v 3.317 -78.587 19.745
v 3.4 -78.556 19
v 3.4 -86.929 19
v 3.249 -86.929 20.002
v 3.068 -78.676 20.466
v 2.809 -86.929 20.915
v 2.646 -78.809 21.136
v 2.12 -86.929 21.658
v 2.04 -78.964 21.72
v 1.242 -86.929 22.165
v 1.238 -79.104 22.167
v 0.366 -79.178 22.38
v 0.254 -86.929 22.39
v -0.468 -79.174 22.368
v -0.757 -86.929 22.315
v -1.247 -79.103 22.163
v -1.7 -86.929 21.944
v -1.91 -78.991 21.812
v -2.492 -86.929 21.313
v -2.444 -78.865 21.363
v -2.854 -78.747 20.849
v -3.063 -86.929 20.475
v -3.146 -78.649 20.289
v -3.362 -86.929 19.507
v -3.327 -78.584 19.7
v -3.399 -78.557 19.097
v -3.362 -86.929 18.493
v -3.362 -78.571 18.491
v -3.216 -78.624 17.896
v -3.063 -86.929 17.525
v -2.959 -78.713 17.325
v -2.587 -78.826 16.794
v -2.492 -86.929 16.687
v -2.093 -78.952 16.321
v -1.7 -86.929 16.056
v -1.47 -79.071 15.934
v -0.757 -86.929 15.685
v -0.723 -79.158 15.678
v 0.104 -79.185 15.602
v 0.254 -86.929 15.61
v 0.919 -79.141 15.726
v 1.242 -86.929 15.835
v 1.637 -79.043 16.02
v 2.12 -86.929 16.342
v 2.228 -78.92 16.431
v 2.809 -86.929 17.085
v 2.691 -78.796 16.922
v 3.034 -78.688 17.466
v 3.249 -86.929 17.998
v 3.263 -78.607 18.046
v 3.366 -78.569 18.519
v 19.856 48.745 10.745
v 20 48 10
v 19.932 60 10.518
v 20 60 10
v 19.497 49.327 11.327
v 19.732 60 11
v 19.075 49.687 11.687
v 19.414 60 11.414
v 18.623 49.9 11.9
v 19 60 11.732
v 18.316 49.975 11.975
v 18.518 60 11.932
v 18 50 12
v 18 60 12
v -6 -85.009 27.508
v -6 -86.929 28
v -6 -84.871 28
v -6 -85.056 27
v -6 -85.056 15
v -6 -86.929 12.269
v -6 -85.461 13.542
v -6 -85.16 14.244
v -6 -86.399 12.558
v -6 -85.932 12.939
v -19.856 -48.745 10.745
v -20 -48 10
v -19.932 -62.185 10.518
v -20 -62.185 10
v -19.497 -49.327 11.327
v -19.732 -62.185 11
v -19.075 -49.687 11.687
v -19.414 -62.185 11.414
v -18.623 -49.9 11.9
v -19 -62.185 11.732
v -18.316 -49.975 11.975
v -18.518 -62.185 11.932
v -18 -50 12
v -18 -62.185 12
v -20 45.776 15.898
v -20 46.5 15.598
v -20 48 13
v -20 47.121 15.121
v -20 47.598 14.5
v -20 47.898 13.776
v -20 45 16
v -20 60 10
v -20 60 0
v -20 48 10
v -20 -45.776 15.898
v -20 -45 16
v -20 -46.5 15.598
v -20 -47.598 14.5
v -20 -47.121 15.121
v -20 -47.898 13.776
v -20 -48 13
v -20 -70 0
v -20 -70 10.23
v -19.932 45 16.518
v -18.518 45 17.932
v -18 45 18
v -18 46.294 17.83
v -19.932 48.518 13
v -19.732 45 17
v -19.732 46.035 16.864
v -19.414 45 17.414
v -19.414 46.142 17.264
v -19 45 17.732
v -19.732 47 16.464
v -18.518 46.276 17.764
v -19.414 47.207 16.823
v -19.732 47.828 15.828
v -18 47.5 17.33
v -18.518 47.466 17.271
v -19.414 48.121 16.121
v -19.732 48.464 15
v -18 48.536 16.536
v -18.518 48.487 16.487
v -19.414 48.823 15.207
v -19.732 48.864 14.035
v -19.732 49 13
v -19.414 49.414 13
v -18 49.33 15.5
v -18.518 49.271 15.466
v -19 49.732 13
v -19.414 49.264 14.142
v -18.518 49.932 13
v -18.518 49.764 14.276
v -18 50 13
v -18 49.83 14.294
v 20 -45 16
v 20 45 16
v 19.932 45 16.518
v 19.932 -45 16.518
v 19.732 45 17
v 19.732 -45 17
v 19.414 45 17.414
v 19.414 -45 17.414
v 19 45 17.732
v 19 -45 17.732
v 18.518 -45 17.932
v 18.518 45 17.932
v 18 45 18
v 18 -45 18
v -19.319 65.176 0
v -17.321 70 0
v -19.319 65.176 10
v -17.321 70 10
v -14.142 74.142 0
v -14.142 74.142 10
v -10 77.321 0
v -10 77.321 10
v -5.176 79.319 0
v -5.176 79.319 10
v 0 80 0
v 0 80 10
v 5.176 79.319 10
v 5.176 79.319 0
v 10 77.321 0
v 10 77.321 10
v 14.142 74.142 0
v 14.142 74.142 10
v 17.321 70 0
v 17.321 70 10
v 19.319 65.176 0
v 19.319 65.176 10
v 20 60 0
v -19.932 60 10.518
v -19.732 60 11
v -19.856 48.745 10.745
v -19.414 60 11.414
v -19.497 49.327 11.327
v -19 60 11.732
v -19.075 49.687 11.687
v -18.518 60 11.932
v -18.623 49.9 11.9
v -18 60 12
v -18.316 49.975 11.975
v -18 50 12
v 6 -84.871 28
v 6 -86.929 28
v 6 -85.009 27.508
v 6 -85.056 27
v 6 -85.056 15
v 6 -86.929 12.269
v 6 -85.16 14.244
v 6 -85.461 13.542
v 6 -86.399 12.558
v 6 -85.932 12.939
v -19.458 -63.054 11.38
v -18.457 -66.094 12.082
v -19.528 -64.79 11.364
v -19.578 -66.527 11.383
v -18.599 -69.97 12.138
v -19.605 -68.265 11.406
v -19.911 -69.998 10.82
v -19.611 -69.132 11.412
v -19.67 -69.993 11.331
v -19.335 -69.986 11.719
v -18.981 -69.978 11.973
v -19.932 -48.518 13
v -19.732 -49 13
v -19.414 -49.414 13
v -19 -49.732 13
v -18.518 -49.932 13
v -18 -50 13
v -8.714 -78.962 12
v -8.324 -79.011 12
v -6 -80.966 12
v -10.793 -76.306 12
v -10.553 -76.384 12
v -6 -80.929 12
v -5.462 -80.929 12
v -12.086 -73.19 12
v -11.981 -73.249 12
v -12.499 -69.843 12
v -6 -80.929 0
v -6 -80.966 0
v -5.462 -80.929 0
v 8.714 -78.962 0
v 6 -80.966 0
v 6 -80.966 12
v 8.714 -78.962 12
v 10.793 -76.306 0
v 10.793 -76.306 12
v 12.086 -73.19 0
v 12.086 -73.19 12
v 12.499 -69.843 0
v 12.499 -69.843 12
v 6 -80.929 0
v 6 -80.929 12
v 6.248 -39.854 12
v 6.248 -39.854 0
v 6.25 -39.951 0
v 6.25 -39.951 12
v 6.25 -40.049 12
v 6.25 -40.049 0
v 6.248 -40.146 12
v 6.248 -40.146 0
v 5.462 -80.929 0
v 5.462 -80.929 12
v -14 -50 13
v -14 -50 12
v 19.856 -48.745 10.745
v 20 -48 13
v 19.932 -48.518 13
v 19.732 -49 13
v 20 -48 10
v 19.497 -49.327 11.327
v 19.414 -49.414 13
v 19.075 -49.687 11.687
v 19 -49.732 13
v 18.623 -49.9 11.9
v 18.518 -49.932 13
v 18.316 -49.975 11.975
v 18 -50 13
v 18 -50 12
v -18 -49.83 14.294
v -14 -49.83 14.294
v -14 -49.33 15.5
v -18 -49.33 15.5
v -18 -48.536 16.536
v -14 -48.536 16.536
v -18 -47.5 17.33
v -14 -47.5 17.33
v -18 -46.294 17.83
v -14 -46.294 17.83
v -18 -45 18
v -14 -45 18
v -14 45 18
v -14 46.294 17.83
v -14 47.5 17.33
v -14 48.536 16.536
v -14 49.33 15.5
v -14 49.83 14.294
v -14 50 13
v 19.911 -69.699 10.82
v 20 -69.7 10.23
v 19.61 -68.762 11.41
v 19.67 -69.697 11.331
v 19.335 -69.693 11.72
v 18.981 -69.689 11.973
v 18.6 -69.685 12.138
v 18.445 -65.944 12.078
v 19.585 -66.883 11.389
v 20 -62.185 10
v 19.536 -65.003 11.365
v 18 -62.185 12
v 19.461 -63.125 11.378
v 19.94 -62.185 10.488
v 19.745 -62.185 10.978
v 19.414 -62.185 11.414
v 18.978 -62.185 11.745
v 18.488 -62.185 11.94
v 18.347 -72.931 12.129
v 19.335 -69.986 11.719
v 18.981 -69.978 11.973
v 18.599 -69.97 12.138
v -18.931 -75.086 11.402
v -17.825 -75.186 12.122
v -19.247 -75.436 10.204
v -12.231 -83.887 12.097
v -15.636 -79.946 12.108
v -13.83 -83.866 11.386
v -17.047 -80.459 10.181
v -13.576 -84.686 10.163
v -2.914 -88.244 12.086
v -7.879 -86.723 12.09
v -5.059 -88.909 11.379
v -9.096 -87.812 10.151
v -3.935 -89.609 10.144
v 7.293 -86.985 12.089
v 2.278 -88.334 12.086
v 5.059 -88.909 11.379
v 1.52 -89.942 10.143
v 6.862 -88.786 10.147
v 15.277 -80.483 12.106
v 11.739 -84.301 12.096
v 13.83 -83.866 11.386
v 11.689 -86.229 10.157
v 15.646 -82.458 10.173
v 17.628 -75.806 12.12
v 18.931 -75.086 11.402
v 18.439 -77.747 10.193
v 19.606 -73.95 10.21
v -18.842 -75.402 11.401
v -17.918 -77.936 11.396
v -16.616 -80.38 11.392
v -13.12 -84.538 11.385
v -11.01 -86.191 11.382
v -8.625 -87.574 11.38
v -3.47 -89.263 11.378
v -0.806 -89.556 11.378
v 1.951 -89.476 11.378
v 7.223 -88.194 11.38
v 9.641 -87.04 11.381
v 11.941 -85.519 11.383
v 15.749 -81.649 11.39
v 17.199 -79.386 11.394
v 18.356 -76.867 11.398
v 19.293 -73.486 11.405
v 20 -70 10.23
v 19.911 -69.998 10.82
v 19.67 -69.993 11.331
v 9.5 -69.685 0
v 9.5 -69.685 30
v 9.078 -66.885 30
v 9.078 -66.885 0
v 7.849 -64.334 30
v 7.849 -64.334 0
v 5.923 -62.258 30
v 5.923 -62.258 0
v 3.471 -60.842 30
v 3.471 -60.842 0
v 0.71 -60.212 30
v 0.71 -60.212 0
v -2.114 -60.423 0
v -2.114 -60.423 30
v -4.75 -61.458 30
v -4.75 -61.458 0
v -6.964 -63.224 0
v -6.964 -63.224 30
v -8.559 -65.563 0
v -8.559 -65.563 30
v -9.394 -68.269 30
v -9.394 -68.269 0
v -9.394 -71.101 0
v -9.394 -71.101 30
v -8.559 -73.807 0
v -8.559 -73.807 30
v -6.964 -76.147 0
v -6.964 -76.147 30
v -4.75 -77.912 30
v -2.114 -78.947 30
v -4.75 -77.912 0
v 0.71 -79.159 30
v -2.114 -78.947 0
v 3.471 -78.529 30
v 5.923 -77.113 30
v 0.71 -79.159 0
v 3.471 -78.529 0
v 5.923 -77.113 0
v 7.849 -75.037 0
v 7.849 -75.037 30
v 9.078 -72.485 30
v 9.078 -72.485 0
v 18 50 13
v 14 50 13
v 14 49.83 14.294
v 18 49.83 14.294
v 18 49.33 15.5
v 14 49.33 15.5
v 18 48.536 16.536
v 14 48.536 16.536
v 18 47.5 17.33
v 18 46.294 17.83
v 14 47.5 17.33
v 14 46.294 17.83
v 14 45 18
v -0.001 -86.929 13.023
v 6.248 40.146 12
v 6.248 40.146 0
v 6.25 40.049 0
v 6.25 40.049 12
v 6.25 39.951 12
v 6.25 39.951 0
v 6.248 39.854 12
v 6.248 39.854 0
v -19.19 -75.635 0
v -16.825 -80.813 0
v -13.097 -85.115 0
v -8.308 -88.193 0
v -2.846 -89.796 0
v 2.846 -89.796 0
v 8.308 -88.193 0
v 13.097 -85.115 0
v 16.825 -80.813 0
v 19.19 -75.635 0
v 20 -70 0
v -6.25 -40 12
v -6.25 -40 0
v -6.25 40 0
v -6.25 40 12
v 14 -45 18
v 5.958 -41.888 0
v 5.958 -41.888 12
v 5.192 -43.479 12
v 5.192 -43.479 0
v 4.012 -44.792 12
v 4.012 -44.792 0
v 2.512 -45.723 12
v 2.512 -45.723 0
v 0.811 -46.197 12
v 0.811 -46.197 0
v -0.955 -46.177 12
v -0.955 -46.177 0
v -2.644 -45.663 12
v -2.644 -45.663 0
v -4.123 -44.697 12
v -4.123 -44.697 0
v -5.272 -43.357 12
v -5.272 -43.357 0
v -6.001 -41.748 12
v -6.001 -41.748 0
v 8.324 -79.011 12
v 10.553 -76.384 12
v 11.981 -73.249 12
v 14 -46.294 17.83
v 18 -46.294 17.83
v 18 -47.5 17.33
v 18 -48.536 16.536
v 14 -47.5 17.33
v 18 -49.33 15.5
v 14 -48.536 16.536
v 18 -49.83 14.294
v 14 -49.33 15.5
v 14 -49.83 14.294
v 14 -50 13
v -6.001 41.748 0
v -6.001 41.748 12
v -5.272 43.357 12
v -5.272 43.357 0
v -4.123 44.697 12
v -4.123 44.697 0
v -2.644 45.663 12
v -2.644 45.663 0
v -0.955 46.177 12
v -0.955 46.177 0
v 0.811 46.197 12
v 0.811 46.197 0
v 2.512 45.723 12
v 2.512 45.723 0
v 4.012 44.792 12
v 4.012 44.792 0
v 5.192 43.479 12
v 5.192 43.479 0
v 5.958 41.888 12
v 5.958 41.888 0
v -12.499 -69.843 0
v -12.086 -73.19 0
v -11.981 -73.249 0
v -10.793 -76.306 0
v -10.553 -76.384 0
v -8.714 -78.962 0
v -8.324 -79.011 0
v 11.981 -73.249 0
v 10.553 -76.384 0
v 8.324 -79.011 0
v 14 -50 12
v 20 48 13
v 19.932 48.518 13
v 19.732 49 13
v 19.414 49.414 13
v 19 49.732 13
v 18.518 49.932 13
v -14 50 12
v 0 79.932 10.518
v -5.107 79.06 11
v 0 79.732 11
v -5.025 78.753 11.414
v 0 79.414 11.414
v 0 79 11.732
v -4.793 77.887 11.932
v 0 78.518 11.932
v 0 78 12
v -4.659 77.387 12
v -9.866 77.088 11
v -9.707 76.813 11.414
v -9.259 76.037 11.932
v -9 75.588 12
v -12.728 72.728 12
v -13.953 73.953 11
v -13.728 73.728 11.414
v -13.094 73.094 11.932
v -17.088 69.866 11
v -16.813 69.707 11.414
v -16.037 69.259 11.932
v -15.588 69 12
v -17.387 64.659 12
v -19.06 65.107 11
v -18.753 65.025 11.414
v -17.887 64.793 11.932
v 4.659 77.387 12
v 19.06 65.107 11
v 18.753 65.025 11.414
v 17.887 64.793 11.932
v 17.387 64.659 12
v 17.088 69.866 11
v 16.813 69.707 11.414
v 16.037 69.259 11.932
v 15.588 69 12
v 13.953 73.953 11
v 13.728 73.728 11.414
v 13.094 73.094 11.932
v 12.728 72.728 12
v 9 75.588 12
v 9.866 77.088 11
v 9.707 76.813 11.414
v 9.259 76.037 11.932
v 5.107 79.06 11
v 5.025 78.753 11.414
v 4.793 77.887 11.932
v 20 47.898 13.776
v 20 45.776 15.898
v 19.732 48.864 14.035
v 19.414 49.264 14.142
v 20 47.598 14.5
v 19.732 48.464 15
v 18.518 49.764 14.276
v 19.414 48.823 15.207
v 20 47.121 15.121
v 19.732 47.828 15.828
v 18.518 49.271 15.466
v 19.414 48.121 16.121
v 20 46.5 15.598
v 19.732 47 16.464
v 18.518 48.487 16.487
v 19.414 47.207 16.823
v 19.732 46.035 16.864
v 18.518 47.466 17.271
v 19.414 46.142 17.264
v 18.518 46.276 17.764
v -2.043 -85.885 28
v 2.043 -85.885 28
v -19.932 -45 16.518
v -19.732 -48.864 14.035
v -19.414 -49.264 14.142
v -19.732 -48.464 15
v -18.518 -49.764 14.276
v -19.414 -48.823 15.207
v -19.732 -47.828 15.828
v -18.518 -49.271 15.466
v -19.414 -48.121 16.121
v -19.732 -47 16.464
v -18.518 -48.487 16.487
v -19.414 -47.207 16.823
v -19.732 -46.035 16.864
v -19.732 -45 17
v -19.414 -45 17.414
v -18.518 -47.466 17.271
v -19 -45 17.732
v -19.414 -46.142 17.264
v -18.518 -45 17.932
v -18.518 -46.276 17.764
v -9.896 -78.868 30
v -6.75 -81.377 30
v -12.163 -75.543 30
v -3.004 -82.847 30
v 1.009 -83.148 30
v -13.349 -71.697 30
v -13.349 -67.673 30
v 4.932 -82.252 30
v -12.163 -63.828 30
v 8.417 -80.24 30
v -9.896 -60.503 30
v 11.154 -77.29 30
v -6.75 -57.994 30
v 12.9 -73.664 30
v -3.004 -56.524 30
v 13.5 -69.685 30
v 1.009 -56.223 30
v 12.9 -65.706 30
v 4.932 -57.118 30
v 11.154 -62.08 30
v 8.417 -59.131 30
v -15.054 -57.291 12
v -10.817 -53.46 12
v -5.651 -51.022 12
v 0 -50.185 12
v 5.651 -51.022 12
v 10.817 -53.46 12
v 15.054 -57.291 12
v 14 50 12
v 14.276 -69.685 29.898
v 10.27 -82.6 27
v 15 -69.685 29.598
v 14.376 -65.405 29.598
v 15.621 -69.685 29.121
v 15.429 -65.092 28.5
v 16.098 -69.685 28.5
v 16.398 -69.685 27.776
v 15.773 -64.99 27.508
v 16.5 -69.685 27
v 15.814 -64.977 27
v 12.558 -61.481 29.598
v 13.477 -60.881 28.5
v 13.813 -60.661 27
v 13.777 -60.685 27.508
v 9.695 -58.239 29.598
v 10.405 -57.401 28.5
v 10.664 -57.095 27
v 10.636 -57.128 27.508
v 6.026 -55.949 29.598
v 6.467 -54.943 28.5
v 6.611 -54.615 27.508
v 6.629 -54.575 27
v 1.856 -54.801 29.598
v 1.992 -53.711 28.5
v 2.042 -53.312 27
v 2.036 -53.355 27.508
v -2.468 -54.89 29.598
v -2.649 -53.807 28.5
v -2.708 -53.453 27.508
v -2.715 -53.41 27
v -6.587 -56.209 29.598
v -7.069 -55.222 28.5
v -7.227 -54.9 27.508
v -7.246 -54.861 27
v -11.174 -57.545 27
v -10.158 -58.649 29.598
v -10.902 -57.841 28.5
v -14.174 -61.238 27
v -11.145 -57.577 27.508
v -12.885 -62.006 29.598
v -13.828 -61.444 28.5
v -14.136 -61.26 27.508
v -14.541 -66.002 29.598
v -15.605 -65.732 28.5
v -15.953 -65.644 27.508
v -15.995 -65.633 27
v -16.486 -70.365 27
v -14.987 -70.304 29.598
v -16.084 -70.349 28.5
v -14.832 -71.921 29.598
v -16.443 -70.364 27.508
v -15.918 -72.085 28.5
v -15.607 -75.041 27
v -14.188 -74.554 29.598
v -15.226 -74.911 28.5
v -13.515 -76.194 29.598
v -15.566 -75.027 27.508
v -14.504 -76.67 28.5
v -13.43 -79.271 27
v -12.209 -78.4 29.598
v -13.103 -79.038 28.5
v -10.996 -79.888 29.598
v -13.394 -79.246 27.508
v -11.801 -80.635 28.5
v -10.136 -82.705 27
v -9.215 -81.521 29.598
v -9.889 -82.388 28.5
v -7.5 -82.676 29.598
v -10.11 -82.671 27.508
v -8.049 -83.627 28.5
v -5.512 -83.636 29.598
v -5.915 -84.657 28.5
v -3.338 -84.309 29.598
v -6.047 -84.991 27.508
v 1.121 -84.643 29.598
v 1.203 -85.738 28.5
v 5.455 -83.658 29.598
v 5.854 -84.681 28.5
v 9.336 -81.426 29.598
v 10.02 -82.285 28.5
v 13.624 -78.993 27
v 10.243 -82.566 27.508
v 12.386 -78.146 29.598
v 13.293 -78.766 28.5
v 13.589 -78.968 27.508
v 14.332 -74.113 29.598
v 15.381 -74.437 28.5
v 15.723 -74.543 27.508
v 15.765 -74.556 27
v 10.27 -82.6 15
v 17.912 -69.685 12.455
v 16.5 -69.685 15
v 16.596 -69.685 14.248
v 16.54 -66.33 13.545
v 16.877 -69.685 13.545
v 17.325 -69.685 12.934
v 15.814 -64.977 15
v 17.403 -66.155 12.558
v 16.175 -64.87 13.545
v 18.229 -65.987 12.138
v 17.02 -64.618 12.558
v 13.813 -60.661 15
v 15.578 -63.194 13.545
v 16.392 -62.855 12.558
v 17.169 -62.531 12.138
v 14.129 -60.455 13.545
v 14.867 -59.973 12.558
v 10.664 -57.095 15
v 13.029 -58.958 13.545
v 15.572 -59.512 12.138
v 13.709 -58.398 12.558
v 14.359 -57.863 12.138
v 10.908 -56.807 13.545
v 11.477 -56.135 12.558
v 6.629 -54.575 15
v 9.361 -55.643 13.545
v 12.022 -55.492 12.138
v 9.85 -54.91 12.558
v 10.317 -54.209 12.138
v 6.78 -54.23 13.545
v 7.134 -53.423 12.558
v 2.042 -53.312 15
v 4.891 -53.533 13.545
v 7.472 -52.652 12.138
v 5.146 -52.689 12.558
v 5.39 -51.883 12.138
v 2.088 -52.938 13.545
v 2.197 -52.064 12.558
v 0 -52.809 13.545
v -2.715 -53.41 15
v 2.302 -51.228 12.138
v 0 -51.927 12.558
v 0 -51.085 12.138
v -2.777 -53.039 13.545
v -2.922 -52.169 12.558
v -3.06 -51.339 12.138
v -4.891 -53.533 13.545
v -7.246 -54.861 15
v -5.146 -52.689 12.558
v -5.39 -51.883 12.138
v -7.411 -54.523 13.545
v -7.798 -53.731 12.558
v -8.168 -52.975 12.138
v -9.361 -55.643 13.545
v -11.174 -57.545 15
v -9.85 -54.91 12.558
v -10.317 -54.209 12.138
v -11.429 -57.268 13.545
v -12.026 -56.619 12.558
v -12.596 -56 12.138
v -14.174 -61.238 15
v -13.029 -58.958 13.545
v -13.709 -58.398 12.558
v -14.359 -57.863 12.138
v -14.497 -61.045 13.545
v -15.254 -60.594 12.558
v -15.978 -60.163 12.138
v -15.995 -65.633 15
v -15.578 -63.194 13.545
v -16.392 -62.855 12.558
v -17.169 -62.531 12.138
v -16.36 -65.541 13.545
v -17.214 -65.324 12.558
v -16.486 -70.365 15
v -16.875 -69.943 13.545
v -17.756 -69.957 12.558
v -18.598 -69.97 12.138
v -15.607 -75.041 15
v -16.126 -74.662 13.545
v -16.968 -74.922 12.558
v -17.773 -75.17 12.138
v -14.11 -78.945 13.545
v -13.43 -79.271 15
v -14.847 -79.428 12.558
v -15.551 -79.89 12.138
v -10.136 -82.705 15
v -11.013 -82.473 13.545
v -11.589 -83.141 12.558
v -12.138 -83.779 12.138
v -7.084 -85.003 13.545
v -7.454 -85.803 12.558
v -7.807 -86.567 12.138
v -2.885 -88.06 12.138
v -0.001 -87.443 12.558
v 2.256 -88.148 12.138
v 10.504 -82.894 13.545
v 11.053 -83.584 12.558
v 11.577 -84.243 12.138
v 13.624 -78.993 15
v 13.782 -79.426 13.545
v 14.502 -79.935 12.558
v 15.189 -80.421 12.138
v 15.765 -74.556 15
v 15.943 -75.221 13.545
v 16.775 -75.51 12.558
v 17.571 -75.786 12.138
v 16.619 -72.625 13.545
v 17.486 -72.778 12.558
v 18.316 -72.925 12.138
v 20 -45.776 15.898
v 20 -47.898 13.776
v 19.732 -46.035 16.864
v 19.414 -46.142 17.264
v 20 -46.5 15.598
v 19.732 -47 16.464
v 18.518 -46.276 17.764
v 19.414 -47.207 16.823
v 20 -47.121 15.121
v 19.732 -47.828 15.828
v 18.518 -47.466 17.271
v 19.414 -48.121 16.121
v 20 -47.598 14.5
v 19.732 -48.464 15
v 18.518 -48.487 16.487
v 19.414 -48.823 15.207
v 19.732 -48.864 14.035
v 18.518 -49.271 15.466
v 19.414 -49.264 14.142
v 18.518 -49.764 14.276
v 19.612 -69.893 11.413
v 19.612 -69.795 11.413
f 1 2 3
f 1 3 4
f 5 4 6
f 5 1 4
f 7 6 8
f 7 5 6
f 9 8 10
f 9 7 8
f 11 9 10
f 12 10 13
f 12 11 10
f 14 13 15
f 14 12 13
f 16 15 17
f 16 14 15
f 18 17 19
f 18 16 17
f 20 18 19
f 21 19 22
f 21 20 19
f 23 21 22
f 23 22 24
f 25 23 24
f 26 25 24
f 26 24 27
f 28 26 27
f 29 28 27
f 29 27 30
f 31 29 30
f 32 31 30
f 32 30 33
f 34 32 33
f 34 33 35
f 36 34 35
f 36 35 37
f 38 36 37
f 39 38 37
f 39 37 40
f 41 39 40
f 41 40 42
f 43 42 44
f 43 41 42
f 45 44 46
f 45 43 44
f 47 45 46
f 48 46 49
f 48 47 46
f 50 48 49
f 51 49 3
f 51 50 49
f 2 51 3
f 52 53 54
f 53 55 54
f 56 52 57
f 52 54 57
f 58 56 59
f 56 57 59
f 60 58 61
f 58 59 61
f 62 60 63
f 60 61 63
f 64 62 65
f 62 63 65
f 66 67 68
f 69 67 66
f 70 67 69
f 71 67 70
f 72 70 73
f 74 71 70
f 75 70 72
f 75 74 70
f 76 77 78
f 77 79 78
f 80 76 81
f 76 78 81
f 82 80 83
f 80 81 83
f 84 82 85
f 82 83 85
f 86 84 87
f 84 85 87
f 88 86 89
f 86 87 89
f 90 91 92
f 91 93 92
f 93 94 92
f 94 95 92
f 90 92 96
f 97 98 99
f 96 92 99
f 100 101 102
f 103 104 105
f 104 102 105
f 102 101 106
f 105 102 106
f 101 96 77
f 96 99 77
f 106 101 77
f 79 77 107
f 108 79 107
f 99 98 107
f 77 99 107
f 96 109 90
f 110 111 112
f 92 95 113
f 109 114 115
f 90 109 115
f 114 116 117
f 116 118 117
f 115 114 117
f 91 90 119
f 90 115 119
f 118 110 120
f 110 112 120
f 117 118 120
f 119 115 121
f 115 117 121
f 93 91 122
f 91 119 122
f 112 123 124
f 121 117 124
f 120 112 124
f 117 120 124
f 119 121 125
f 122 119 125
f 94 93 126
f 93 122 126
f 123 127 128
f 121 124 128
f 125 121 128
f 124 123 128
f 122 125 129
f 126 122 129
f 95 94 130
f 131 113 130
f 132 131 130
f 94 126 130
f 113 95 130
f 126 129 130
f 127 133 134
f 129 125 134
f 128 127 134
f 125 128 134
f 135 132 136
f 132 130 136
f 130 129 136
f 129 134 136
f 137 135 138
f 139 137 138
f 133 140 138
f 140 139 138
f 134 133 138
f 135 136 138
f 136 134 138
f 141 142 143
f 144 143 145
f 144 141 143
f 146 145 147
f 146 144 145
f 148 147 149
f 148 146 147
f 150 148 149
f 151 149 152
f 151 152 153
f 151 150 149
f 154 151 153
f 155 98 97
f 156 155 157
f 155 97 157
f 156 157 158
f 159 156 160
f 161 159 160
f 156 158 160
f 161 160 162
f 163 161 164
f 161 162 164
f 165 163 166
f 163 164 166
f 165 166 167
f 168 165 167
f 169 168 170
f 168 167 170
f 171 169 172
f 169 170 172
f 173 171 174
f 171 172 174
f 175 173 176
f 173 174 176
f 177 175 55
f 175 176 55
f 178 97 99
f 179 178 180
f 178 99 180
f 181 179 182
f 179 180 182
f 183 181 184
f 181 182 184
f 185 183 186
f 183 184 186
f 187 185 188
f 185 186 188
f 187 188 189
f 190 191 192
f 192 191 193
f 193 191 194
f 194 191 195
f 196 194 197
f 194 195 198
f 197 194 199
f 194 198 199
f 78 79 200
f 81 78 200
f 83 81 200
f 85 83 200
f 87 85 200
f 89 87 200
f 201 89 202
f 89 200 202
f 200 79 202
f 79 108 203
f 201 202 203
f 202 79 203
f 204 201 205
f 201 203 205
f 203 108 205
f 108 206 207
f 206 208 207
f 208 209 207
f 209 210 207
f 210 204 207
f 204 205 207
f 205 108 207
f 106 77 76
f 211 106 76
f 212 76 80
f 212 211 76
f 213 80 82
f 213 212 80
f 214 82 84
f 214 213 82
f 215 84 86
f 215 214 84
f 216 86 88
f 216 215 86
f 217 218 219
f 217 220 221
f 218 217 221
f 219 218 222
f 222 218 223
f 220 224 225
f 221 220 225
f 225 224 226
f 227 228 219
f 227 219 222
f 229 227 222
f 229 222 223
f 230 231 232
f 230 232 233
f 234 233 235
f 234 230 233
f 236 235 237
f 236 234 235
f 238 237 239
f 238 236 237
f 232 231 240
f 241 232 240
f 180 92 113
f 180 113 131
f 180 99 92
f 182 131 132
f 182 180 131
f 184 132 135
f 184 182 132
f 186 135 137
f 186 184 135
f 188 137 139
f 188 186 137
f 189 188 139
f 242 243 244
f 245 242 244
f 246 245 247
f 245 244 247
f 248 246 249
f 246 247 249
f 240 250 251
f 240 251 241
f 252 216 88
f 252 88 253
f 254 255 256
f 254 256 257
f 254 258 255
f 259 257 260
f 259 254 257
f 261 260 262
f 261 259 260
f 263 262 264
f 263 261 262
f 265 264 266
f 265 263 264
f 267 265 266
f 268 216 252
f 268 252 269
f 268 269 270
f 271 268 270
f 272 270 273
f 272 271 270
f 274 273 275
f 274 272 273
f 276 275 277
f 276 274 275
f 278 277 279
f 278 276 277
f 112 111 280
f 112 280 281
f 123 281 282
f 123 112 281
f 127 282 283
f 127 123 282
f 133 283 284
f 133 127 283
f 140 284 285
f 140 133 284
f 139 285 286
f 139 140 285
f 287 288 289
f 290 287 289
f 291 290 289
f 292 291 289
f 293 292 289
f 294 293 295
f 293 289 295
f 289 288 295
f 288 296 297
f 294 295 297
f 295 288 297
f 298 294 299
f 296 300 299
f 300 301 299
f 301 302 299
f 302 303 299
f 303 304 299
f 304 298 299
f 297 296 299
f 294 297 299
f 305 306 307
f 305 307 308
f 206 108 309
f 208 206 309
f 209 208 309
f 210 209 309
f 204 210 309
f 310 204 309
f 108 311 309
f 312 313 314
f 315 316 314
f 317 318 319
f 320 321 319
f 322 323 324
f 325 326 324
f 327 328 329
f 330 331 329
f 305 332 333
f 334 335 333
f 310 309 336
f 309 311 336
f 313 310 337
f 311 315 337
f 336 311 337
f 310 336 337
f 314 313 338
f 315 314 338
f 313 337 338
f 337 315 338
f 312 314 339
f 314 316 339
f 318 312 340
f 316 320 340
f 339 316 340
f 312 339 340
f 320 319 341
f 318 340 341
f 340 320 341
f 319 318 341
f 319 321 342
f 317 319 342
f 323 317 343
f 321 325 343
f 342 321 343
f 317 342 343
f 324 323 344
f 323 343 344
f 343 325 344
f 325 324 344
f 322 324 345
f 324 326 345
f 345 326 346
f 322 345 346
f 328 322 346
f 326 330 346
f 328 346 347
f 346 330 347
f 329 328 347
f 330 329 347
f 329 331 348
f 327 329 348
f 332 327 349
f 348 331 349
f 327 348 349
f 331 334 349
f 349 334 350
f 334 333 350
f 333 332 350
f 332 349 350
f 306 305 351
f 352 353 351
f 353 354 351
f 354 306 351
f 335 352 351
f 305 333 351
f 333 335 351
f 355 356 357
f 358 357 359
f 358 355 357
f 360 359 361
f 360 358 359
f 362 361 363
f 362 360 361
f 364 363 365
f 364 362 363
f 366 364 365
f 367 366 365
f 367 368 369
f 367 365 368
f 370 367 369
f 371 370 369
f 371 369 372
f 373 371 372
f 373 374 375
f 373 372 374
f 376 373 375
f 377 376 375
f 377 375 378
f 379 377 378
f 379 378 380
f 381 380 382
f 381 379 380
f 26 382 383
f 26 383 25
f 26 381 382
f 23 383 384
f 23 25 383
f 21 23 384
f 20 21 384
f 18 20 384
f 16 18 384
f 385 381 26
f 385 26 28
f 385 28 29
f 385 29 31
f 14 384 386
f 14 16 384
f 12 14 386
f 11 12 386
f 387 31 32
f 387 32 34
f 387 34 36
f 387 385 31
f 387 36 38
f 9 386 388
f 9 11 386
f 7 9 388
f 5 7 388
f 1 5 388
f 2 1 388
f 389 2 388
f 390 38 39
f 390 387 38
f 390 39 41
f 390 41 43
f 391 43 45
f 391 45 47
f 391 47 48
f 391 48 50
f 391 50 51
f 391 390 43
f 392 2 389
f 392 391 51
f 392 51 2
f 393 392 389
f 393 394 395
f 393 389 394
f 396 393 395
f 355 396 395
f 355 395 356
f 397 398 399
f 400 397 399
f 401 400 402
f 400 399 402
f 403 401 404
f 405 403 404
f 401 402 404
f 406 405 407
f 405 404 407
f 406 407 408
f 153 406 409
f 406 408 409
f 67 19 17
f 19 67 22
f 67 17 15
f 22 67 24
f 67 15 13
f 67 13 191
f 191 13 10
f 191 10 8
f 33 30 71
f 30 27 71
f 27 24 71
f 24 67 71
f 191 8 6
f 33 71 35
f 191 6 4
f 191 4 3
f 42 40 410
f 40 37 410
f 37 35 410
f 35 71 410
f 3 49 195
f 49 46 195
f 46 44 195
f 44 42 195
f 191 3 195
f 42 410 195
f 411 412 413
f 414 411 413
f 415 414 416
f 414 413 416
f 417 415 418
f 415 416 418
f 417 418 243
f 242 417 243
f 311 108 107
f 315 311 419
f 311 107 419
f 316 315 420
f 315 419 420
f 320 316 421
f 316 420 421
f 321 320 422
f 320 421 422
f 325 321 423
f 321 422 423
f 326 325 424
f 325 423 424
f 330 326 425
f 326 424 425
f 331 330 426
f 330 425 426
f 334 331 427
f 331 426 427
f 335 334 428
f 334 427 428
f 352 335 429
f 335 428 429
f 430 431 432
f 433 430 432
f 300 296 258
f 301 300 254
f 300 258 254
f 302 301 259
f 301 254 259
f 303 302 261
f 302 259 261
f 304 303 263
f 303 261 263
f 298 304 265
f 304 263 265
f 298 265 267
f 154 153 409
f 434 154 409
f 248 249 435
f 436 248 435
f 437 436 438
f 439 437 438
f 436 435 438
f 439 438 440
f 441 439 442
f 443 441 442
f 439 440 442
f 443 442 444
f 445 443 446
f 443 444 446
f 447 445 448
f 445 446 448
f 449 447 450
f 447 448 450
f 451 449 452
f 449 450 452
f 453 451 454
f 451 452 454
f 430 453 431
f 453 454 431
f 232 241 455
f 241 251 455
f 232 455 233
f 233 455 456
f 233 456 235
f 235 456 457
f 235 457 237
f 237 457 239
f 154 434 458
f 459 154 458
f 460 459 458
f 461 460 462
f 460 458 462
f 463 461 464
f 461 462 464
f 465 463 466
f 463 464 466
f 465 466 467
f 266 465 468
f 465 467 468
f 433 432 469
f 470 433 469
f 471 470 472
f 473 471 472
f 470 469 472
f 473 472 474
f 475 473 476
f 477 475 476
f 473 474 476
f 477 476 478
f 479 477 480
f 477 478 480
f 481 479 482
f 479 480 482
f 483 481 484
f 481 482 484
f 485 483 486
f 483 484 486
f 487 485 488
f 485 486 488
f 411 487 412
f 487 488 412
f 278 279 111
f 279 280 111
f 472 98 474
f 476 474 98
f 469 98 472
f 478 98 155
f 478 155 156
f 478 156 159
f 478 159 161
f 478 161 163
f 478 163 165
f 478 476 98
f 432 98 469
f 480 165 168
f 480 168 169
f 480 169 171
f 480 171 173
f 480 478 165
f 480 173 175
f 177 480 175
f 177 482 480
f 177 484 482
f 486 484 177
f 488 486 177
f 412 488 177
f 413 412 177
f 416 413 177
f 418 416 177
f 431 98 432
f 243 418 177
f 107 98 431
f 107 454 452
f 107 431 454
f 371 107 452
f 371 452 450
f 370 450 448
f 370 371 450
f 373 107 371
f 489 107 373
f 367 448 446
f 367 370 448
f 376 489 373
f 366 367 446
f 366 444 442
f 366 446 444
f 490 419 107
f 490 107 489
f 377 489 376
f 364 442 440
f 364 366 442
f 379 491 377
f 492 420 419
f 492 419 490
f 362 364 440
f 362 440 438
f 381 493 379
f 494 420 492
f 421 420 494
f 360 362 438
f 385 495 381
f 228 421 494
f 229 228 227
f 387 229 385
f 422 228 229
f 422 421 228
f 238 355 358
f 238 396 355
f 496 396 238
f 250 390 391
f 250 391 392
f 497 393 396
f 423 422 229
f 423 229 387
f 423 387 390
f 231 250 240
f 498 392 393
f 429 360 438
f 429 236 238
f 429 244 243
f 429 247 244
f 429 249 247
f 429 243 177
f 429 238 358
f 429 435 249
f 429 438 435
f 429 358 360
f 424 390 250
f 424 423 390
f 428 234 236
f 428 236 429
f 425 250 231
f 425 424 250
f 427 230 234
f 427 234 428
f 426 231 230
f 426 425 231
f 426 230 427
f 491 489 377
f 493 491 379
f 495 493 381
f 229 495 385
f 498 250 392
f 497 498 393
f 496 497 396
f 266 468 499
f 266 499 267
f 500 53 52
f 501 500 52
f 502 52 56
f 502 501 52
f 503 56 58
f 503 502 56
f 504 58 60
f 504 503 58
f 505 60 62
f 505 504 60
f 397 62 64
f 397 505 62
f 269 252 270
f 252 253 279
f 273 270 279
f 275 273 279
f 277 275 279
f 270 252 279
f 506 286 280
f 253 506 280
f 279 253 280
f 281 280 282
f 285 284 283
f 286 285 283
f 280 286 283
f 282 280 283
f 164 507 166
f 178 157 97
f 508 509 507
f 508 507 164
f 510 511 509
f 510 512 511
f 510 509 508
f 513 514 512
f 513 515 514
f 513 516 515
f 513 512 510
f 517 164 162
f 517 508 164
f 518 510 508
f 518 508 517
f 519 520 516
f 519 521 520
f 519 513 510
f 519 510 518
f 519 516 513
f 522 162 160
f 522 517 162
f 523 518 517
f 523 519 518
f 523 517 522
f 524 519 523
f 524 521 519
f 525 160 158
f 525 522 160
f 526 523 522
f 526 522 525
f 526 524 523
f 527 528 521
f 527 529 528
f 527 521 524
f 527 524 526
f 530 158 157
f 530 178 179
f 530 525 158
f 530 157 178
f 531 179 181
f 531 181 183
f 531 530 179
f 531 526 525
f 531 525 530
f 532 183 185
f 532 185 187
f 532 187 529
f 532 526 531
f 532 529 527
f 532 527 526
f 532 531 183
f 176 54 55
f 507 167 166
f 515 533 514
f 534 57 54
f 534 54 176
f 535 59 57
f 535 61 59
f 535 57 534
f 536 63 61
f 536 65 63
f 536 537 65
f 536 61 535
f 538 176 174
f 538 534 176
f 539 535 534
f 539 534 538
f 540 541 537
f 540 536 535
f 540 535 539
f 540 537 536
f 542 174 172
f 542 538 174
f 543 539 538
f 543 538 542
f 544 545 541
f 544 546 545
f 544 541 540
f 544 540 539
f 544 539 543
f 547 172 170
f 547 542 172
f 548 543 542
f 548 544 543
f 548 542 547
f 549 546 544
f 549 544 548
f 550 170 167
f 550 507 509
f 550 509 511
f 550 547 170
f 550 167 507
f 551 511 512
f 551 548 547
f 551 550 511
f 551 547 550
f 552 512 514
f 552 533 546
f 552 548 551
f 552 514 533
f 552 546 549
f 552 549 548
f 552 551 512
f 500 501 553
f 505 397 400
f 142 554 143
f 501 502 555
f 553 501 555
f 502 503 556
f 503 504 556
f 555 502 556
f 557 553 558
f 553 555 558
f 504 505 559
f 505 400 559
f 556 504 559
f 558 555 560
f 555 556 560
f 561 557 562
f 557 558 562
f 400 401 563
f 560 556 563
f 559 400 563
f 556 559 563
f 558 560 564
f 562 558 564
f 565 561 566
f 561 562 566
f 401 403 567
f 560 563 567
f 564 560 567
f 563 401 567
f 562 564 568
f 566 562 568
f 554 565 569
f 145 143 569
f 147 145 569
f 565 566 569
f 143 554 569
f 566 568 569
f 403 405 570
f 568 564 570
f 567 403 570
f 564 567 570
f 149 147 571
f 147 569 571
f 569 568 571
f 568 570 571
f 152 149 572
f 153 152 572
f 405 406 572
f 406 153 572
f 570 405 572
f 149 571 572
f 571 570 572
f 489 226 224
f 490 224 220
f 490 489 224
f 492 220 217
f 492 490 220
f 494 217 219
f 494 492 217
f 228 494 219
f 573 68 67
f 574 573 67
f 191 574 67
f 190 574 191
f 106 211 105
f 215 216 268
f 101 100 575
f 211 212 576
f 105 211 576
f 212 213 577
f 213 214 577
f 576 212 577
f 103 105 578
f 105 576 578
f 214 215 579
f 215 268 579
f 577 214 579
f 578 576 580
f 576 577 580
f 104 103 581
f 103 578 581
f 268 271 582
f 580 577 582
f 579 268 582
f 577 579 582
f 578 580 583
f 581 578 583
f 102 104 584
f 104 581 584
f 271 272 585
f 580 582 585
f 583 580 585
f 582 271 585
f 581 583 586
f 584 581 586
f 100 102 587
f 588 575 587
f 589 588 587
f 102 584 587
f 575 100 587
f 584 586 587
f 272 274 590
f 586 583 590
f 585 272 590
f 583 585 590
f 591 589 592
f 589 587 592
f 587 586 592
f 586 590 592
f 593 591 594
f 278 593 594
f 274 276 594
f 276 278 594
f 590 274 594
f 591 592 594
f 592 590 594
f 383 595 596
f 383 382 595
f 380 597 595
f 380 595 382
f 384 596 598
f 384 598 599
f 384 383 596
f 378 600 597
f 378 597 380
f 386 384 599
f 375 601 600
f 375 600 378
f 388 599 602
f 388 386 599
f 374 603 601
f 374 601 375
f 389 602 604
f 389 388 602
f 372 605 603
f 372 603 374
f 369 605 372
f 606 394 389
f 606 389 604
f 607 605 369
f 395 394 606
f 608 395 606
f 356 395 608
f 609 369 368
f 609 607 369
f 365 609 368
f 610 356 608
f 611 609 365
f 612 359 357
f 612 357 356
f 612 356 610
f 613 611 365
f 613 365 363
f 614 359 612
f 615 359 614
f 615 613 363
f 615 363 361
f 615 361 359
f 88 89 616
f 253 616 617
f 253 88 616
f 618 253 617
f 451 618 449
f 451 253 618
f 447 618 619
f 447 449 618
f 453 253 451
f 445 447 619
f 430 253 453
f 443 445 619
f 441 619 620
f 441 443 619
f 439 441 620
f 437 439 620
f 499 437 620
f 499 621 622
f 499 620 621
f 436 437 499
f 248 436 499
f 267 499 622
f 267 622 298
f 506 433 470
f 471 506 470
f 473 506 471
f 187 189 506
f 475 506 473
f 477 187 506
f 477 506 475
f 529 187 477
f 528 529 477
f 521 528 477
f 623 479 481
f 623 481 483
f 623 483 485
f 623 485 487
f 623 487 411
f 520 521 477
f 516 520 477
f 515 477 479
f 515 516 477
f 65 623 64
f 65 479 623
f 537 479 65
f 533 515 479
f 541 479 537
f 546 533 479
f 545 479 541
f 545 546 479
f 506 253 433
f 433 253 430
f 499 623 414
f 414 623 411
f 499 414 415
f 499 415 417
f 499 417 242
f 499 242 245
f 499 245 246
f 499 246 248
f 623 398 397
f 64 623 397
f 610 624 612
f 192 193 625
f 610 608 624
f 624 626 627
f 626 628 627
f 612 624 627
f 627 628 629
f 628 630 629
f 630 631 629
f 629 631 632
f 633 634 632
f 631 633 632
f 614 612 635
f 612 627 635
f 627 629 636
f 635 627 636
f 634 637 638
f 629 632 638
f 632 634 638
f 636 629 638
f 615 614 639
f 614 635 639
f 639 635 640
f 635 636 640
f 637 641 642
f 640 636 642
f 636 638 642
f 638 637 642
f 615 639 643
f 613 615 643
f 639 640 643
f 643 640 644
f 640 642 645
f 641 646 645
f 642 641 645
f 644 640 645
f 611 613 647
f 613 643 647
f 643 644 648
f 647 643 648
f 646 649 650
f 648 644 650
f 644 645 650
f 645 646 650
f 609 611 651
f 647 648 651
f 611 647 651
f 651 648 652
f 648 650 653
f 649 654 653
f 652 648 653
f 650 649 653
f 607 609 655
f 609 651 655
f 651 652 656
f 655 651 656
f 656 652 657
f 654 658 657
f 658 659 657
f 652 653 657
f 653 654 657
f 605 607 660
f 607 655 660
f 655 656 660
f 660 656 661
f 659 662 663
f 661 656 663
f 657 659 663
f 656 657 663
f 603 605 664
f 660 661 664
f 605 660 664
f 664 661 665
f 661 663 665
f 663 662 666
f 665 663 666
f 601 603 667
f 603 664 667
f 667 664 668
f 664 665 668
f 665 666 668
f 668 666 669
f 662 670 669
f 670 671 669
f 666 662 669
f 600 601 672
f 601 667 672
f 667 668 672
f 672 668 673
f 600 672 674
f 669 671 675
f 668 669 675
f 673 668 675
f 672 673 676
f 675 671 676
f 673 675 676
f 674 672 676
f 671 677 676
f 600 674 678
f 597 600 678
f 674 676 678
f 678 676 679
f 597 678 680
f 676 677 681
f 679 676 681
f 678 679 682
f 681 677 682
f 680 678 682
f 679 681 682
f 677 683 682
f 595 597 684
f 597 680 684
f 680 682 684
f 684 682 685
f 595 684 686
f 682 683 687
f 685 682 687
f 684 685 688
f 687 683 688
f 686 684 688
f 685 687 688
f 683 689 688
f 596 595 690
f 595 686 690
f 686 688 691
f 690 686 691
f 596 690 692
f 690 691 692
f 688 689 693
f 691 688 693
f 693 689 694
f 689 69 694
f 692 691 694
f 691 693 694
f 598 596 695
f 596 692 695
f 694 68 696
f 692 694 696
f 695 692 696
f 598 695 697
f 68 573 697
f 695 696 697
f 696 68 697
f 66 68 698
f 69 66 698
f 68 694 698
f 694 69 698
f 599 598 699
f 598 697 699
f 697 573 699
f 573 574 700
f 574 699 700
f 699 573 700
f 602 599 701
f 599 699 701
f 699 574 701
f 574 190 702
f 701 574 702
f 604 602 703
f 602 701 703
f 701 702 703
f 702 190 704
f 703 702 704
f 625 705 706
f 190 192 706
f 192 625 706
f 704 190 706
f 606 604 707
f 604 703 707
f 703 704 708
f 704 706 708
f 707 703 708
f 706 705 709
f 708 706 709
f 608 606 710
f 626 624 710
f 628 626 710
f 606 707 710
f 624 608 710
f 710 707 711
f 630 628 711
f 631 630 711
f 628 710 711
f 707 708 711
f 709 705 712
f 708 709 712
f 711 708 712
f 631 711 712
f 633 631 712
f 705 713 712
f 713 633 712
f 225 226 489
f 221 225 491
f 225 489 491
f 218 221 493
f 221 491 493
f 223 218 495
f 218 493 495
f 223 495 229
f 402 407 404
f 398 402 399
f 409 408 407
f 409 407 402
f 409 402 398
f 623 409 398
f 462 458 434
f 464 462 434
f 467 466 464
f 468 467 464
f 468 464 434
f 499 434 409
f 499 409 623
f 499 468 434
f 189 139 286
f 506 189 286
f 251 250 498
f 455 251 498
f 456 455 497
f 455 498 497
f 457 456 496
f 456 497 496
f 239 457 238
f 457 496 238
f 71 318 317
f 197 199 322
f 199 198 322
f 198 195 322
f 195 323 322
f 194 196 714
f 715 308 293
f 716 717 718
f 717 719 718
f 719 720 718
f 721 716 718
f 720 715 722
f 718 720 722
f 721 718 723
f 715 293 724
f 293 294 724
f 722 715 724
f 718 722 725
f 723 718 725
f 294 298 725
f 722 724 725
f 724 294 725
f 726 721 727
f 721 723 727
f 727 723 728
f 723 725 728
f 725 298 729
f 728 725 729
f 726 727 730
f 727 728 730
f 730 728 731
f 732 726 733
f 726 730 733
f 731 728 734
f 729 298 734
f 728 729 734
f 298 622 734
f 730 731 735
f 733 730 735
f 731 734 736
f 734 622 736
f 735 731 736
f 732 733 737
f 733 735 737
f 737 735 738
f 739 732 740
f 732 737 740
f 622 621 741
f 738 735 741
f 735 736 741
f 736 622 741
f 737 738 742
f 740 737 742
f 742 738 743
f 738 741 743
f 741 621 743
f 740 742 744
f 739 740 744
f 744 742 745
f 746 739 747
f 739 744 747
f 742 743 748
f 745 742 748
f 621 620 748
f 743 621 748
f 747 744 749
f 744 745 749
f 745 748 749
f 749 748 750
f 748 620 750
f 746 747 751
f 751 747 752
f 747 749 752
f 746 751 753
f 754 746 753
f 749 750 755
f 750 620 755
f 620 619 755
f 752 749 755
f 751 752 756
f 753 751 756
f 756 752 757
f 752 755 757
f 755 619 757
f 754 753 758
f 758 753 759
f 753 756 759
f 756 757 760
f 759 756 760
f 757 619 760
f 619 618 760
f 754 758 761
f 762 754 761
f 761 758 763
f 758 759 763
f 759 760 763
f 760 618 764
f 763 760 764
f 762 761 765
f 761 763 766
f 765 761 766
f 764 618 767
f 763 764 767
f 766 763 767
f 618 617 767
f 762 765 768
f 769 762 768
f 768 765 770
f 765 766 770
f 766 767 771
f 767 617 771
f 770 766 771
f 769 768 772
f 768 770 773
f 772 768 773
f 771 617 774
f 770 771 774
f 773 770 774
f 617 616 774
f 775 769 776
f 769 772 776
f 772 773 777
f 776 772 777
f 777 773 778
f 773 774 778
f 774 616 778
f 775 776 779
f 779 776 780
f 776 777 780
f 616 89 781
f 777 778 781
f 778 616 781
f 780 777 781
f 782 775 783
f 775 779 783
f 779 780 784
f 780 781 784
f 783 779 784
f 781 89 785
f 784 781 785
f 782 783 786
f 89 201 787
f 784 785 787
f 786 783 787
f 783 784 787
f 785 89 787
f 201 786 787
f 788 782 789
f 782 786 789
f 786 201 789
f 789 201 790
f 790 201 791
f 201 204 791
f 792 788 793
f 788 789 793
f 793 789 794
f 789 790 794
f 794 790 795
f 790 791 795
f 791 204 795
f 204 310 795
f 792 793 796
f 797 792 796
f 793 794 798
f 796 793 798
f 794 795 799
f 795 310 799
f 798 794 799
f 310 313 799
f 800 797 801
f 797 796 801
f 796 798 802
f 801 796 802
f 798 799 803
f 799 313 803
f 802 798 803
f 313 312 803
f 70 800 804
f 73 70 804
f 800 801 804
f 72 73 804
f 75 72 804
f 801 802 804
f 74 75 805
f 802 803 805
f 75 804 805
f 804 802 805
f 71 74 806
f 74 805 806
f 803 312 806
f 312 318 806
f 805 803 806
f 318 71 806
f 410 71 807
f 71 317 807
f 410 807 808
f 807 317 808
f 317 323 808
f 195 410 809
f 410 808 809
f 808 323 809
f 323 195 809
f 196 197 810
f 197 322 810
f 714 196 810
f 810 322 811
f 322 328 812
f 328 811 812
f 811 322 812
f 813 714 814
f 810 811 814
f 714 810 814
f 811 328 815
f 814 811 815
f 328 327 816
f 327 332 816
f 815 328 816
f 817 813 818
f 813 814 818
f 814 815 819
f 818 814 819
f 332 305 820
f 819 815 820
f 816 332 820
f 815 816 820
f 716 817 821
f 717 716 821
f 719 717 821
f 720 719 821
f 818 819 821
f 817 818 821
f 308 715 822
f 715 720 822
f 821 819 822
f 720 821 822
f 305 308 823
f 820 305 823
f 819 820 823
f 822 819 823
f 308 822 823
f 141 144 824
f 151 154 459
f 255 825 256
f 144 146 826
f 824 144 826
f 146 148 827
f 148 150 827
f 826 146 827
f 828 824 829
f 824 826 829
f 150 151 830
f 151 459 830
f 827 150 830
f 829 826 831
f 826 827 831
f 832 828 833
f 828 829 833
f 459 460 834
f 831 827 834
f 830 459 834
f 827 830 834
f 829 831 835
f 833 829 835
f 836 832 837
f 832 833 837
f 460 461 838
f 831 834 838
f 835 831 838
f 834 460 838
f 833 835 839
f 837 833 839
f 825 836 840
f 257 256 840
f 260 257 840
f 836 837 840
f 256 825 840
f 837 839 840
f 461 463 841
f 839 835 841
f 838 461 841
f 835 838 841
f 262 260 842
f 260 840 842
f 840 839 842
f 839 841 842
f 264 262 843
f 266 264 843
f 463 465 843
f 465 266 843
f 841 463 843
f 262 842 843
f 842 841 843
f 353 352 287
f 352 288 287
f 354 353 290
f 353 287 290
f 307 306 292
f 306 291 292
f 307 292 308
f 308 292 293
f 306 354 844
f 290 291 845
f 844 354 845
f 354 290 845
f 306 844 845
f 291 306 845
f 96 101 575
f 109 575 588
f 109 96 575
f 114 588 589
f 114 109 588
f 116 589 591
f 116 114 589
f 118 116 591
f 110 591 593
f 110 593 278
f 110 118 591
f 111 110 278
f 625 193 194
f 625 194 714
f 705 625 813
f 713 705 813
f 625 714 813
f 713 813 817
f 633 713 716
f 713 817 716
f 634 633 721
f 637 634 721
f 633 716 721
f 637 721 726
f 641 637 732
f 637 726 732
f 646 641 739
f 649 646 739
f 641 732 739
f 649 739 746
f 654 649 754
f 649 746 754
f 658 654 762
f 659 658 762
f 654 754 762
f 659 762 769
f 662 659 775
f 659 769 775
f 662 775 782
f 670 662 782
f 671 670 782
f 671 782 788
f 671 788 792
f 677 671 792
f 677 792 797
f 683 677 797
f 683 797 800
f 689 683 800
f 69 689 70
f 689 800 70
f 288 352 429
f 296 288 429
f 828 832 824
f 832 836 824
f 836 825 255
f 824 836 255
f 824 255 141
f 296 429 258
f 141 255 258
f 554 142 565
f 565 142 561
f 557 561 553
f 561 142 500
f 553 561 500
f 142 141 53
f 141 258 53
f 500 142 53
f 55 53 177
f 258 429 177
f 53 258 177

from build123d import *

# Parameters (mm, degrees)
F0_R          = 12.5
F1_DEPTH      = 12
F3_START      = 12
F2_R          = 16.5
F2_R_2        = 12.5
F2_R_3        = 9.5
F3_DEPTH      = 18
F4_DEPTH      = 30
F5_R          = 9.5
F6_DEPTH      = 25
F6_DEPTH_BACK = 100
F7_R          = 3
F9_DEPTH      = 50
F9_DEPTH_BACK = 50
F10_R         = 5
F11_R         = 19.99999
F12_W         = 12
F12_H         = 6
F13_DEPTH     = 28
F15_START     = 70
F14_R         = 3.4
F15_DEPTH     = 30
F16_R         = 2


# Not quite as in the source:
# - a fillet or chamfer is up to 0.001 mm smaller than in the source, because OpenCascade refuses the exact size


with BuildPart() as f1:
    # F0 (on Top) → F1 (new body)
    with BuildSketch(Plane.XY):
        with BuildLine():
            Line((20, -70), (20, 80))
            Line((20, 80), (-20, 80))
            Line((-20, 80), (-20, -70))
            ThreePointArc((-20, -70), (0, -90), (20, -70))
        make_face()
        with Locations((0, -70)):
            Circle(F0_R, mode=Mode.SUBTRACT)
        with BuildLine():
            ThreePointArc((6.2482987692, -40.1458166336), (-0.0729132787, -46.2495746778), (-6.25, -40))
            Line((-6.25, -40), (-6.25, 40))
            ThreePointArc((-6.25, 40), (-0.0729132787, 46.2495746778), (6.2482987692, 40.1458166336))
            ThreePointArc((6.2482987692, 40.1458166336), (6.25, 40), (6.2482987692, 39.8541833664))
            Line((6.2482987692, 39.8541833664), (6.2482987692, -39.8541833664))
            ThreePointArc((6.2482987692, -39.8541833664), (6.25, -40), (6.2482987692, -40.1458166336))
        make_face(mode=Mode.SUBTRACT)
    extrude(amount=F1_DEPTH)

    # F2 (on Top) → F3 (join)
    with BuildSketch(Plane.XY.offset(F3_START)):
        with Locations((0, -69.6852505207)):
            Circle(F2_R)
        with Locations((0, -69.6852505207)):
            Circle(F2_R_2, mode=Mode.SUBTRACT)
        with Locations((0, -69.6852505207)):
            Circle(F2_R_2)
        with Locations((0, -69.6852505207)):
            Circle(F2_R_3, mode=Mode.SUBTRACT)
    extrude(amount=F3_DEPTH)

    # F2 (on Top) → F4 (join)
    with BuildSketch(Plane.XY):
        with Locations((0, -69.6852505207)):
            Circle(F2_R_2)
        with Locations((0, -69.6852505207)):
            Circle(F2_R_3, mode=Mode.SUBTRACT)
        with Locations((0, -69.6852505207)):
            Circle(F2_R_3)
    extrude(amount=F4_DEPTH)

    # F5 (on Top) → F6 (cut, two sides)
    with BuildSketch(Plane.XY) as f6_sk:
        with Locations((0, -69.6852505207)):
            Circle(F5_R)
    extrude(amount=-F6_DEPTH, mode=Mode.SUBTRACT)
    extrude(f6_sk.sketch, amount=F6_DEPTH_BACK, mode=Mode.SUBTRACT)

    # F7
    f7_edges = [f1.edges().sort_by_distance(p)[0] for p in [
        (-16.5, -69.685251, 30),
        (-16.5, -69.685251, 12),
    ]]
    fillet(f7_edges, radius=F7_R)

    # F8 (on Front) → F9 (join, two sides)
    with BuildSketch(Plane.XZ) as f9_sk:
        Polygon((14, 0), (20, 0), (20, 18), (14, 18), (14, 12), align=None)
        Polygon((-14, 0), (-14, 12), (-14, 18), (-20, 18), (-20, 0), align=None)
    extrude(amount=F9_DEPTH)
    extrude(f9_sk.sketch, amount=-F9_DEPTH_BACK)

    # F10
    f10_edges = [f1.edges().sort_by_distance(p)[0] for p in [
        (17, 50, 18),
        (-17, 50, 18),
        (-17, -50, 18),
        (17, -50, 18),
    ]]
    fillet(f10_edges, radius=F10_R)

    # F11 (radius 20 in the source; OpenCascade refuses exactly that, so slightly less here)
    f11_edges = [f1.edges().sort_by_distance(p)[0] for p in [
        (-20, 80, 6),
        (20, 80, 6),
    ]]
    fillet(f11_edges, radius=F11_R)

    # F12 (on Top) → F13 (join)
    with BuildSketch(Plane.XY):
        with Locations((0, -83.9288532734)):
            Rectangle(F12_W, F12_H)
    extrude(amount=F13_DEPTH)

    # F14 (on Front) → F15 (cut)
    with BuildSketch(Plane.XZ.offset(F15_START)):
        with Locations((0, 19)):
            Circle(F14_R)
    extrude(amount=F15_DEPTH, mode=Mode.SUBTRACT)

    # F16
    f16_edges = [f1.edges().sort_by_distance(p)[0] for p in [
        (20, 55.000005, 12),
        (-14.142139, 74.142139, 12),
        (-20, 55.000005, 12),
        (20, -60, 12),
        (-20, -48.535534, 16.535534),
        (-20, 0, 18),
        (20, 0, 18),
        (20, -48.535534, 16.535534),
    ]]
    fillet(f16_edges, radius=F16_R)


solid = f1.part
